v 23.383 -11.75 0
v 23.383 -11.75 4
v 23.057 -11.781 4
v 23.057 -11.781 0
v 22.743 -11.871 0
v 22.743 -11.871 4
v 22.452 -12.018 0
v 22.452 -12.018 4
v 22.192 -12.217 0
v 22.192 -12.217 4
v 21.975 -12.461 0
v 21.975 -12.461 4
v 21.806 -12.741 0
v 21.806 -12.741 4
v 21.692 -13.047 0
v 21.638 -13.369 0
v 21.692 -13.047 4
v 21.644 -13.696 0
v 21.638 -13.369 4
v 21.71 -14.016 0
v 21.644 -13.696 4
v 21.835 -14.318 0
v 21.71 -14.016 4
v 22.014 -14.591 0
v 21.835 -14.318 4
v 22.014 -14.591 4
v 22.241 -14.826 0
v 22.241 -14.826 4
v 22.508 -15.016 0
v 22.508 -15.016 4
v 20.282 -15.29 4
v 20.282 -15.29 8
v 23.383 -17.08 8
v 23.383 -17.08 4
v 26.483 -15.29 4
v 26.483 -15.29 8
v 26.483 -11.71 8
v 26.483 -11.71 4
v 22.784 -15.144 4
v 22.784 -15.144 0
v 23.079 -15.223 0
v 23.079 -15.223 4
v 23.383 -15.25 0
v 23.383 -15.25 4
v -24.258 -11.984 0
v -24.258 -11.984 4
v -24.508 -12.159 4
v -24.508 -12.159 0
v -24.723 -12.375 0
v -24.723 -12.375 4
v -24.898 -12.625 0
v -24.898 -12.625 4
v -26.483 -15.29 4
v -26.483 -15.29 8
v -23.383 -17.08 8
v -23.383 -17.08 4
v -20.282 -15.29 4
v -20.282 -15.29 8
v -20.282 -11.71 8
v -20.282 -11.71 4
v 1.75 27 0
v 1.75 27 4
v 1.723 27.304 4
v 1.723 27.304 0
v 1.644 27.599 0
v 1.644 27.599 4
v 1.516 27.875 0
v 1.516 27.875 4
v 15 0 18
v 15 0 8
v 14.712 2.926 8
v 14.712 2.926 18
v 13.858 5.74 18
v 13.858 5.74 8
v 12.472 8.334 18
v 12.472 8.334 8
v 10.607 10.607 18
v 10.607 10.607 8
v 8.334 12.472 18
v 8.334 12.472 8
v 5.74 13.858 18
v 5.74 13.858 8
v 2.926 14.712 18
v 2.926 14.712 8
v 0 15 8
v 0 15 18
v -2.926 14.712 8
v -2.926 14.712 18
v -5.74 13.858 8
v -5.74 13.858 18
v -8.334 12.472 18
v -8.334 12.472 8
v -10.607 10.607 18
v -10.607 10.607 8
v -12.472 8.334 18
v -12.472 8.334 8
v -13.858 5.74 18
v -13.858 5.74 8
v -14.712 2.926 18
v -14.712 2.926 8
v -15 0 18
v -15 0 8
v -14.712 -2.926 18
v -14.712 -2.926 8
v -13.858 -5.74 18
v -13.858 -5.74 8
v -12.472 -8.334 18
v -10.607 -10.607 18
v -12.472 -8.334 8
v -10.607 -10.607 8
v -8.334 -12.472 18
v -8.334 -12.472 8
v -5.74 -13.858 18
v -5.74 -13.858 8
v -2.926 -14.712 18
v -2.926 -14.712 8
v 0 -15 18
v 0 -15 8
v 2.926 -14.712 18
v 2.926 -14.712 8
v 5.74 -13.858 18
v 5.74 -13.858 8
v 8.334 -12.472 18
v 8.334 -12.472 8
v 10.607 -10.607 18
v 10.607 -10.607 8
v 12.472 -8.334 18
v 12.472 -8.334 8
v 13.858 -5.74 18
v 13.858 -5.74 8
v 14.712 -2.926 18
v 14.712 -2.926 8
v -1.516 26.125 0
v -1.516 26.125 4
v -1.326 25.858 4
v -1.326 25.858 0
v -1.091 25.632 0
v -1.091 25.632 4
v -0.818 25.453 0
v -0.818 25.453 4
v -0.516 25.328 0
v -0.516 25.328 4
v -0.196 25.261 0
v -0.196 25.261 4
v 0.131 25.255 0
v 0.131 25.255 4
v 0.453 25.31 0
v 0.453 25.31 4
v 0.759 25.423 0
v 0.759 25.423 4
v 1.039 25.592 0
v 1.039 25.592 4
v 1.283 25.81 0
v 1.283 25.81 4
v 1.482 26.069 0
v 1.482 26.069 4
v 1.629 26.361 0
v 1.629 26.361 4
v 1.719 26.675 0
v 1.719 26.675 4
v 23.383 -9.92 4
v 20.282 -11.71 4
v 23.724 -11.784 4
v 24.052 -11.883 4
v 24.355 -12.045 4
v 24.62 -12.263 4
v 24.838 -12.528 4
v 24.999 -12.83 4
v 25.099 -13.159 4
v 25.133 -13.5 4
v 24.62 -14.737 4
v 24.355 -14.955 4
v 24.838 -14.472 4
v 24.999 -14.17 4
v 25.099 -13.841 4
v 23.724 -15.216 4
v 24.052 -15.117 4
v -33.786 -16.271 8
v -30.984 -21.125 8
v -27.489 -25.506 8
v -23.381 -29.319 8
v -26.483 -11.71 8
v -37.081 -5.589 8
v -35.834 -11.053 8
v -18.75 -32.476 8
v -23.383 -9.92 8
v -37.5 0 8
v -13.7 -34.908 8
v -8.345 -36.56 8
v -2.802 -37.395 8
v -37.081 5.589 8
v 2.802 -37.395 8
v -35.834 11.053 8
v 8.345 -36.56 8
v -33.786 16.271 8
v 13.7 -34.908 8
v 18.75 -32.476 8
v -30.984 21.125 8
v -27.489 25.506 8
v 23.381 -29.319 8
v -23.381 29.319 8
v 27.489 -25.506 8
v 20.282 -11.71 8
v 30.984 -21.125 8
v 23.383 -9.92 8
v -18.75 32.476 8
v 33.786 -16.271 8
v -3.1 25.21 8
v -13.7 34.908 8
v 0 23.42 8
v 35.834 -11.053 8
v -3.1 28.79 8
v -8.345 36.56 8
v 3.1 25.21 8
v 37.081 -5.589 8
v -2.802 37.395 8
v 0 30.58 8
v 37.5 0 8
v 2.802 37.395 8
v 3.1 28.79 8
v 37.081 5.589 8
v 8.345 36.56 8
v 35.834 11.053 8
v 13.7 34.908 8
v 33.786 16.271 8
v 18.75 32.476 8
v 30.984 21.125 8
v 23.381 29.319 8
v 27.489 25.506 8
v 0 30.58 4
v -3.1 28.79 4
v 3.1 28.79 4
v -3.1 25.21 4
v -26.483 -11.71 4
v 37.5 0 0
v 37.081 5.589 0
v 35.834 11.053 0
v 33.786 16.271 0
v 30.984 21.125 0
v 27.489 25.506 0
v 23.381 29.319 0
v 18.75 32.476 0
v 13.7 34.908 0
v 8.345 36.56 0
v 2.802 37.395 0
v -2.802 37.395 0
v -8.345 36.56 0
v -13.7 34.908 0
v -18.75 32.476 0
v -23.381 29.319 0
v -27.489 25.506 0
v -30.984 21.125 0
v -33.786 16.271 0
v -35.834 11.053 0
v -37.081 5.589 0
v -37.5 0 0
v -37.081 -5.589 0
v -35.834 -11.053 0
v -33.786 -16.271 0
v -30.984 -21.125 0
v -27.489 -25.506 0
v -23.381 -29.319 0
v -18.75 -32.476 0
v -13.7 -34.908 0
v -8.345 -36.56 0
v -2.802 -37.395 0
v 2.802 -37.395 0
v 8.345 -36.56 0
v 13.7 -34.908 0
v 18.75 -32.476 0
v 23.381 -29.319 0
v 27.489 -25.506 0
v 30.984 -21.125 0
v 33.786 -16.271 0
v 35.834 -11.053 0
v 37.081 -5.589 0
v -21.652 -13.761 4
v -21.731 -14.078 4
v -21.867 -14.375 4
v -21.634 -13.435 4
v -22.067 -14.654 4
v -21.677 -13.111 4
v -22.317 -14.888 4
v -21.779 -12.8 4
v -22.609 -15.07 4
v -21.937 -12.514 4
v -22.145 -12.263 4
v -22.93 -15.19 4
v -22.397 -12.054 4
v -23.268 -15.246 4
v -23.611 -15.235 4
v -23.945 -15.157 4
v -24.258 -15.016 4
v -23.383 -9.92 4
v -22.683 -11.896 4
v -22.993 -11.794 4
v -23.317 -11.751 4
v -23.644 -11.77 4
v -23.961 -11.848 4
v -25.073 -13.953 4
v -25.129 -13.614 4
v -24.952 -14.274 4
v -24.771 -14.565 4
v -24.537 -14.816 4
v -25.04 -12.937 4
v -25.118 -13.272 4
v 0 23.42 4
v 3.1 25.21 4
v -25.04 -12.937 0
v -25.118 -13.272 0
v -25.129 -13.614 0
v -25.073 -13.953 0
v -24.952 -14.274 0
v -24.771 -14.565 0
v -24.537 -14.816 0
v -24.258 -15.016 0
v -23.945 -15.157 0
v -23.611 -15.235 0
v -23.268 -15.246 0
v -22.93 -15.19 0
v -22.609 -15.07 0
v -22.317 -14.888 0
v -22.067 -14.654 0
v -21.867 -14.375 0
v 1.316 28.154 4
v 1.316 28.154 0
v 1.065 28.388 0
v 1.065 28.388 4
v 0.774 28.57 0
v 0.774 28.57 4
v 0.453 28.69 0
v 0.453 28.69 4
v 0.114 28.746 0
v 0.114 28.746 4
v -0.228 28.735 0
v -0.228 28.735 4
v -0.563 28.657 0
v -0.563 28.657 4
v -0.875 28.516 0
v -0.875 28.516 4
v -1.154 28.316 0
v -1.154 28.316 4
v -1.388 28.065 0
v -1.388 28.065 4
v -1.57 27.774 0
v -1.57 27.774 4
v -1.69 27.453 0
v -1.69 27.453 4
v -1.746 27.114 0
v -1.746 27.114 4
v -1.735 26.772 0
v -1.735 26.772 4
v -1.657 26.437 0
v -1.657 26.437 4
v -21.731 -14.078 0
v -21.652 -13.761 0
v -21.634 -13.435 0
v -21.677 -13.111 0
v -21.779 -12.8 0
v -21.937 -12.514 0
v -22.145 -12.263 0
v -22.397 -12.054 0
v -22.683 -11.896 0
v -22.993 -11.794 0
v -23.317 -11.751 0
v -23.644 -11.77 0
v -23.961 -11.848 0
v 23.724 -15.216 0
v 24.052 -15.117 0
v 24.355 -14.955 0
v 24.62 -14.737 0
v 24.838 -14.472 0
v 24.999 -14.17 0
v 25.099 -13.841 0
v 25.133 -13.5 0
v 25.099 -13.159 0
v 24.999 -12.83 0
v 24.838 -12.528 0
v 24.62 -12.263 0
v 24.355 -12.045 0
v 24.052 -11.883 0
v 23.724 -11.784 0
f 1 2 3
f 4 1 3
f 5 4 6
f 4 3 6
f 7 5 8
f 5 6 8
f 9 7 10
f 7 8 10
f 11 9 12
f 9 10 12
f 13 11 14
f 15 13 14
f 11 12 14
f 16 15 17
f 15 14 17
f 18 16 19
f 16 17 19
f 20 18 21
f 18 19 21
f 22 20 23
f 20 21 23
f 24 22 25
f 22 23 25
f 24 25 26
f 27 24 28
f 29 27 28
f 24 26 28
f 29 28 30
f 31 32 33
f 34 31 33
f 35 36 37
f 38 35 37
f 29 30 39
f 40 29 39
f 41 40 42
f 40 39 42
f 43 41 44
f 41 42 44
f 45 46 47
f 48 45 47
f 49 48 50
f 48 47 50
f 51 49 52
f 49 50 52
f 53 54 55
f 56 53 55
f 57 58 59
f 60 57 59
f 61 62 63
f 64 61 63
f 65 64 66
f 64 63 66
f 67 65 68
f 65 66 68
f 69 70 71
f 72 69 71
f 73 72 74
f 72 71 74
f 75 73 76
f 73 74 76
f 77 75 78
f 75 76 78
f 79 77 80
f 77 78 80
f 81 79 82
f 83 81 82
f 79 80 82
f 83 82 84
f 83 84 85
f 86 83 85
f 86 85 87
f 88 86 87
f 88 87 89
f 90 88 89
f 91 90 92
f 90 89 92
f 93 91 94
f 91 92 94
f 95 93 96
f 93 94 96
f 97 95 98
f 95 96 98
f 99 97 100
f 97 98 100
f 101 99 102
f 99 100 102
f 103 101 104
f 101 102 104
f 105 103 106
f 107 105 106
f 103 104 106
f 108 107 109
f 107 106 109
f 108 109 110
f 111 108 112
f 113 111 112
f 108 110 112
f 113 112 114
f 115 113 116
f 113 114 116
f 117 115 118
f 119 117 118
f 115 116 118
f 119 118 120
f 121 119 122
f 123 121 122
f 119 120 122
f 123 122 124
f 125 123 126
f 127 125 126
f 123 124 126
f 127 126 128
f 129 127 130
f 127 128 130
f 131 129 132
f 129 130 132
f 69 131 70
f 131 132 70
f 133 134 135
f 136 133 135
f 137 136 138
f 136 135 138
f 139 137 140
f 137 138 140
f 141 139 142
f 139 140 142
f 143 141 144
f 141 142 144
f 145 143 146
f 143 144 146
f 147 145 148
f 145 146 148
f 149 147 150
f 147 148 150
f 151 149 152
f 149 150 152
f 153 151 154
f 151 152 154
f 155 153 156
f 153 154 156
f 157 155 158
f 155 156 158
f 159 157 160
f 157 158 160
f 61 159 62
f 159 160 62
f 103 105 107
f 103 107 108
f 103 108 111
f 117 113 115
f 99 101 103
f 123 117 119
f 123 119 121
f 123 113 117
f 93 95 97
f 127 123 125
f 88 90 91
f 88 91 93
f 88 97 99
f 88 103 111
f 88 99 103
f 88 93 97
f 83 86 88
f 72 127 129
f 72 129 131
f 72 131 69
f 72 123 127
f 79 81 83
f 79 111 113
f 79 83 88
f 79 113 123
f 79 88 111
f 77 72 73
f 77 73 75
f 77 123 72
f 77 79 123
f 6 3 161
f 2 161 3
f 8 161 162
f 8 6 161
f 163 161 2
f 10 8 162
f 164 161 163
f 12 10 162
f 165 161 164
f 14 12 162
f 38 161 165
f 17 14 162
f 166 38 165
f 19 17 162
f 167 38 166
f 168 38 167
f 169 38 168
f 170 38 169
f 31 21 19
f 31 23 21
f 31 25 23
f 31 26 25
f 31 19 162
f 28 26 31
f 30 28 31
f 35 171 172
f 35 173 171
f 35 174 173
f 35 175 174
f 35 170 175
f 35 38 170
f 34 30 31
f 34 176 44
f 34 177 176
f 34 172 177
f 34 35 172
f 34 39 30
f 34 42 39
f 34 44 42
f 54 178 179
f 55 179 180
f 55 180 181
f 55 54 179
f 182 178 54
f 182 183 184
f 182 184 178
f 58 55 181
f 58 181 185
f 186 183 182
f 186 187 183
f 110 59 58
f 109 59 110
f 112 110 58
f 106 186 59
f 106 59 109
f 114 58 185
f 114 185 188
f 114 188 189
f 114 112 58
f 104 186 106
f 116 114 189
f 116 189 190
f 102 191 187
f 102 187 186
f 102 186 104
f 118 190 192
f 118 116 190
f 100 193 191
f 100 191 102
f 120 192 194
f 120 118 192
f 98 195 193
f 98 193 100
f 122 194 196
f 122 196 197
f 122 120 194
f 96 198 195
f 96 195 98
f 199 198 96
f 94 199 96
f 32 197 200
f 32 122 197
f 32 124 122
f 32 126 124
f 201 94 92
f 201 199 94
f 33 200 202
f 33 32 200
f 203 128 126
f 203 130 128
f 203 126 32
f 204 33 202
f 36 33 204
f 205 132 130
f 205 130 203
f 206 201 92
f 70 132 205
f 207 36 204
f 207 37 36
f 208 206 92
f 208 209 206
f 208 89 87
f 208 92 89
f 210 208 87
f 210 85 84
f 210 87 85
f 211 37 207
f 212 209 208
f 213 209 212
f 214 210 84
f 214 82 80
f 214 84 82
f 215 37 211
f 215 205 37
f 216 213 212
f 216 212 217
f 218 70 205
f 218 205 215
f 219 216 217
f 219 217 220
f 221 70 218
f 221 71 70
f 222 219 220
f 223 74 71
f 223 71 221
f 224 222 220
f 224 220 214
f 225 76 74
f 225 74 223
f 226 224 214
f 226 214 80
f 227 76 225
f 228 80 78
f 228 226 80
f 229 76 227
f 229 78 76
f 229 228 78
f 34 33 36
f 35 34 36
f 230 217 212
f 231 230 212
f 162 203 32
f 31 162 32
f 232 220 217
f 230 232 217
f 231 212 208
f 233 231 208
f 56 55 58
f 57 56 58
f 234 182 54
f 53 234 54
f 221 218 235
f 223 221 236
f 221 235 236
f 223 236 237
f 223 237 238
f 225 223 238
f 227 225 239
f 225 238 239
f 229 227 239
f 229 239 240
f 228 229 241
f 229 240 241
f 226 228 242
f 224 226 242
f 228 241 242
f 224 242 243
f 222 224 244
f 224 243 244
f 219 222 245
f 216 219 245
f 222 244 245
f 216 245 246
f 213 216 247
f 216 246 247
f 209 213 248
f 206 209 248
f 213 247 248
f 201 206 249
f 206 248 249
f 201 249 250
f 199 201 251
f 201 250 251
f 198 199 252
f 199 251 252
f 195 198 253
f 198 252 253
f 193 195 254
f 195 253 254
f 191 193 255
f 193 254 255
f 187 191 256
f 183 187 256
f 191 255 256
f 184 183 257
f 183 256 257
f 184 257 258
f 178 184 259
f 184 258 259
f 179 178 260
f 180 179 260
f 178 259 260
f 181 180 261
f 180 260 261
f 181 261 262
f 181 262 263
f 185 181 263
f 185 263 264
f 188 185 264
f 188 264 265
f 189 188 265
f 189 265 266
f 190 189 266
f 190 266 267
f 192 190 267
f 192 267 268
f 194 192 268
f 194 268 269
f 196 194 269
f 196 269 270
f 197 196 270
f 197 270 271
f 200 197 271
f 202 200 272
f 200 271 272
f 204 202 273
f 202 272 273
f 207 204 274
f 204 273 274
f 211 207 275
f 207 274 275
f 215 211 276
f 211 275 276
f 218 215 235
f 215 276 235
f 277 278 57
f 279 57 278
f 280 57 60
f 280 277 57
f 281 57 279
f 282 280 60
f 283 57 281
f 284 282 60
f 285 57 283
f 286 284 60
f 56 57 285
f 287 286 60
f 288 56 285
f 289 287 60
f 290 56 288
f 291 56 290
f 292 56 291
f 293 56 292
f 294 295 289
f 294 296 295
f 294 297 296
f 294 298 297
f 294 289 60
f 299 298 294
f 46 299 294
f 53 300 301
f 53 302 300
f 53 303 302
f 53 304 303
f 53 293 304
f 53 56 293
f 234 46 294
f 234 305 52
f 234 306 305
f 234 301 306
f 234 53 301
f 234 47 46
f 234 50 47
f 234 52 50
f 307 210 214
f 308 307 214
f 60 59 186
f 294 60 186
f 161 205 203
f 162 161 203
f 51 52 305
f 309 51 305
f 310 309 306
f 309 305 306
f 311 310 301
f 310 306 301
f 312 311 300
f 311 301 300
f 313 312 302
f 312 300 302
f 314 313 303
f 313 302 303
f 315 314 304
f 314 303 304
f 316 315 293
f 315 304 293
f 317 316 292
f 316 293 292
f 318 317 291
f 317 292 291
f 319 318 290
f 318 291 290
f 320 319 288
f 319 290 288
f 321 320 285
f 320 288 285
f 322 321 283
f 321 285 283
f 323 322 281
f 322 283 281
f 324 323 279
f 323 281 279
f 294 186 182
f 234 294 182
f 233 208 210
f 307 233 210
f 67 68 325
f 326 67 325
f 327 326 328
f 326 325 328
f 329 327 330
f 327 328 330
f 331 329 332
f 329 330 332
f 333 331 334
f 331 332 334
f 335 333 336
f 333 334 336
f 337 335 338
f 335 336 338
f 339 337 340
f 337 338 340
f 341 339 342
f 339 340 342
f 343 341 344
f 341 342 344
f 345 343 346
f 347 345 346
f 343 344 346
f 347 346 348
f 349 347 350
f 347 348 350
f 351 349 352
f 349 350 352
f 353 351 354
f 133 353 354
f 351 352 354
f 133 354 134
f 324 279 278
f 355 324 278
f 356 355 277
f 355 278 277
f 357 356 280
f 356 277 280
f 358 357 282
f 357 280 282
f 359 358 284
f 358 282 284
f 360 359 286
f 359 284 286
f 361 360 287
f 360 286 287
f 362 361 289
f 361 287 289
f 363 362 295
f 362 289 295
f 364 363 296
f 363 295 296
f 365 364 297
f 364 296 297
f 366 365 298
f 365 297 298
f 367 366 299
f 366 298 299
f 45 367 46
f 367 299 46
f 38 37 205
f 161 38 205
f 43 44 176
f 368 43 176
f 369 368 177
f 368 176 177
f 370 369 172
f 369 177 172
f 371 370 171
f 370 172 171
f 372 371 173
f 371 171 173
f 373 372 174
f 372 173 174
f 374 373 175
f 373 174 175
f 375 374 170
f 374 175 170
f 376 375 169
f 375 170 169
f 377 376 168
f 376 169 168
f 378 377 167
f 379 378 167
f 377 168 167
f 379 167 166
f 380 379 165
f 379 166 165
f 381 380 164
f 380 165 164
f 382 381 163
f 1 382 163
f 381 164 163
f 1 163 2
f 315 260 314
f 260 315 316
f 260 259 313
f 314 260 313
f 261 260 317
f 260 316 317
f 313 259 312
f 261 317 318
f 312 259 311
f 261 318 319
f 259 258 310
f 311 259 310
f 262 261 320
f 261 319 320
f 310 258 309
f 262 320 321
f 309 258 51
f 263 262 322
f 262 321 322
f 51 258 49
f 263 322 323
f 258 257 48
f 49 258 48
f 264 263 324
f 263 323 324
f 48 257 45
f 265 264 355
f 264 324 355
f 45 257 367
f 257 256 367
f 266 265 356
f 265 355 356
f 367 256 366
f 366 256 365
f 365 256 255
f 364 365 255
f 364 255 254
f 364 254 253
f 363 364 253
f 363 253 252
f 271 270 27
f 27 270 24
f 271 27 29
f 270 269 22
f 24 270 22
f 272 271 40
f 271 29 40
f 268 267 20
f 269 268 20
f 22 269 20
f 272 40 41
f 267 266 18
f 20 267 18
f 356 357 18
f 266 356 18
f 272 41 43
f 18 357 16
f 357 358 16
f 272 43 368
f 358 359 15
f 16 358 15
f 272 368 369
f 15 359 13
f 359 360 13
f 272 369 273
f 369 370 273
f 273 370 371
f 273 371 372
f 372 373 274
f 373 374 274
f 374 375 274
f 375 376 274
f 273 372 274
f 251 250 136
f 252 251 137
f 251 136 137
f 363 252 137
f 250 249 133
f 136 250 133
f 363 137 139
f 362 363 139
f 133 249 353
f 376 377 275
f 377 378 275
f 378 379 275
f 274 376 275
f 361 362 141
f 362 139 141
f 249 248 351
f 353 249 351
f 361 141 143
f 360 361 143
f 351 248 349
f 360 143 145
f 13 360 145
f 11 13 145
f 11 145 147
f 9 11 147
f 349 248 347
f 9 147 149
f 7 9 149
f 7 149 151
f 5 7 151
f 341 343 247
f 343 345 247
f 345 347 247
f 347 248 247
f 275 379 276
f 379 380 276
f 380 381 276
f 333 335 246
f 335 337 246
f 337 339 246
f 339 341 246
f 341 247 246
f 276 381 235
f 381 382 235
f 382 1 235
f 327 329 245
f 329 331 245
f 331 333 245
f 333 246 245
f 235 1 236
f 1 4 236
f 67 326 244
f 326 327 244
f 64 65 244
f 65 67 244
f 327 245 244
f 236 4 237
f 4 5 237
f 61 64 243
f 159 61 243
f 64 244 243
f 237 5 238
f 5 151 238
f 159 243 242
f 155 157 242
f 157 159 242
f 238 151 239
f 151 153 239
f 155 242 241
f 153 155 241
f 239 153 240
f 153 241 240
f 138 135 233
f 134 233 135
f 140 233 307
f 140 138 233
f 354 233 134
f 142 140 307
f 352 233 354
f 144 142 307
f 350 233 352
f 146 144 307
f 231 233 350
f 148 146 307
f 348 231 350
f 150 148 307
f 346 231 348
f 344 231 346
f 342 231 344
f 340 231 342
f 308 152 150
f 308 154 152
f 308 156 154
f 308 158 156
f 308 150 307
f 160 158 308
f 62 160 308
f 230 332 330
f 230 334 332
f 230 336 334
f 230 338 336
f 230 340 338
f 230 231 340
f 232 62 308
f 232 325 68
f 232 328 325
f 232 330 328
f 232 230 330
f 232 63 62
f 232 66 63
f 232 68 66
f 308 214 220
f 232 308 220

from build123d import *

# Parameters (mm, degrees)
SKETCH2_R           = 37.5
BOSS_EXTRUDE1_DEPTH = 8
CUT_EXTRUDE1_DEPTH  = 4
CIRPATTERN1_COUNT   = 3
CUT_EXTRUDE2_DEPTH  = 17
CIRPATTERN2_COUNT   = 3
SKETCH6_R           = 15
BOSS_EXTRUDE2_DEPTH = 10


with BuildPart() as part:
    # Sketch2 → Boss-Extrude1 (new body)
    with BuildSketch(Plane.XY):
        Circle(SKETCH2_R)
    extrude(amount=BOSS_EXTRUDE1_DEPTH)

    # Sketch3 → Cut-Extrude1 (cut)
    with BuildSketch(Plane.XY.offset(8)):
        Polygon((0, 23.42), (3.100370946, 25.21), (3.100370946, 28.79), (0, 30.58), (-3.100370946, 28.79), (-3.100370946, 25.21), align=None)
    cut_extrude1 = extrude(amount=-CUT_EXTRUDE1_DEPTH, mode=Mode.SUBTRACT)

    # CirPattern1: Cut-Extrude1 ×3 about axis
    cirpattern1_axis = Axis((0, 0, 0), (0, 0, 1))
    for i in range(1, CIRPATTERN1_COUNT):
        add(cut_extrude1.rotate(cirpattern1_axis, i * 360 / CIRPATTERN1_COUNT), mode=Mode.SUBTRACT)

    # Sketch5 → Cut-Extrude2 (cut)
    with BuildSketch(Plane.XY.offset(4)):
        with BuildLine():
            ThreePointArc((1.515544457, 27.875), (-0.875, 28.515544457), (-1.515544457, 26.125))
            Line((-1.515544457, 26.125), (1.515544457, 27.875))
        make_face()
        with BuildLine():
            Line((1.515544457, 27.875), (-1.515544457, 26.125))
            ThreePointArc((-1.515544457, 26.125), (0.452933329, 25.309629804), (1.75, 27))
            ThreePointArc((1.75, 27), (1.690370196, 27.452933329), (1.515544457, 27.875))
        make_face()
    cut_extrude2 = extrude(amount=-CUT_EXTRUDE2_DEPTH, mode=Mode.SUBTRACT)

    # CirPattern2: Cut-Extrude2 ×3 about axis
    cirpattern2_axis = Axis((0, 0, 0), (0, 0, 1))
    for i in range(1, CIRPATTERN2_COUNT):
        add(cut_extrude2.rotate(cirpattern2_axis, i * 360 / CIRPATTERN2_COUNT), mode=Mode.SUBTRACT)

    # Sketch6 → Boss-Extrude2 (add)
    with BuildSketch(Plane.XY.offset(8)):
        Circle(SKETCH6_R)
    extrude(amount=BOSS_EXTRUDE2_DEPTH)


solid = part.part
